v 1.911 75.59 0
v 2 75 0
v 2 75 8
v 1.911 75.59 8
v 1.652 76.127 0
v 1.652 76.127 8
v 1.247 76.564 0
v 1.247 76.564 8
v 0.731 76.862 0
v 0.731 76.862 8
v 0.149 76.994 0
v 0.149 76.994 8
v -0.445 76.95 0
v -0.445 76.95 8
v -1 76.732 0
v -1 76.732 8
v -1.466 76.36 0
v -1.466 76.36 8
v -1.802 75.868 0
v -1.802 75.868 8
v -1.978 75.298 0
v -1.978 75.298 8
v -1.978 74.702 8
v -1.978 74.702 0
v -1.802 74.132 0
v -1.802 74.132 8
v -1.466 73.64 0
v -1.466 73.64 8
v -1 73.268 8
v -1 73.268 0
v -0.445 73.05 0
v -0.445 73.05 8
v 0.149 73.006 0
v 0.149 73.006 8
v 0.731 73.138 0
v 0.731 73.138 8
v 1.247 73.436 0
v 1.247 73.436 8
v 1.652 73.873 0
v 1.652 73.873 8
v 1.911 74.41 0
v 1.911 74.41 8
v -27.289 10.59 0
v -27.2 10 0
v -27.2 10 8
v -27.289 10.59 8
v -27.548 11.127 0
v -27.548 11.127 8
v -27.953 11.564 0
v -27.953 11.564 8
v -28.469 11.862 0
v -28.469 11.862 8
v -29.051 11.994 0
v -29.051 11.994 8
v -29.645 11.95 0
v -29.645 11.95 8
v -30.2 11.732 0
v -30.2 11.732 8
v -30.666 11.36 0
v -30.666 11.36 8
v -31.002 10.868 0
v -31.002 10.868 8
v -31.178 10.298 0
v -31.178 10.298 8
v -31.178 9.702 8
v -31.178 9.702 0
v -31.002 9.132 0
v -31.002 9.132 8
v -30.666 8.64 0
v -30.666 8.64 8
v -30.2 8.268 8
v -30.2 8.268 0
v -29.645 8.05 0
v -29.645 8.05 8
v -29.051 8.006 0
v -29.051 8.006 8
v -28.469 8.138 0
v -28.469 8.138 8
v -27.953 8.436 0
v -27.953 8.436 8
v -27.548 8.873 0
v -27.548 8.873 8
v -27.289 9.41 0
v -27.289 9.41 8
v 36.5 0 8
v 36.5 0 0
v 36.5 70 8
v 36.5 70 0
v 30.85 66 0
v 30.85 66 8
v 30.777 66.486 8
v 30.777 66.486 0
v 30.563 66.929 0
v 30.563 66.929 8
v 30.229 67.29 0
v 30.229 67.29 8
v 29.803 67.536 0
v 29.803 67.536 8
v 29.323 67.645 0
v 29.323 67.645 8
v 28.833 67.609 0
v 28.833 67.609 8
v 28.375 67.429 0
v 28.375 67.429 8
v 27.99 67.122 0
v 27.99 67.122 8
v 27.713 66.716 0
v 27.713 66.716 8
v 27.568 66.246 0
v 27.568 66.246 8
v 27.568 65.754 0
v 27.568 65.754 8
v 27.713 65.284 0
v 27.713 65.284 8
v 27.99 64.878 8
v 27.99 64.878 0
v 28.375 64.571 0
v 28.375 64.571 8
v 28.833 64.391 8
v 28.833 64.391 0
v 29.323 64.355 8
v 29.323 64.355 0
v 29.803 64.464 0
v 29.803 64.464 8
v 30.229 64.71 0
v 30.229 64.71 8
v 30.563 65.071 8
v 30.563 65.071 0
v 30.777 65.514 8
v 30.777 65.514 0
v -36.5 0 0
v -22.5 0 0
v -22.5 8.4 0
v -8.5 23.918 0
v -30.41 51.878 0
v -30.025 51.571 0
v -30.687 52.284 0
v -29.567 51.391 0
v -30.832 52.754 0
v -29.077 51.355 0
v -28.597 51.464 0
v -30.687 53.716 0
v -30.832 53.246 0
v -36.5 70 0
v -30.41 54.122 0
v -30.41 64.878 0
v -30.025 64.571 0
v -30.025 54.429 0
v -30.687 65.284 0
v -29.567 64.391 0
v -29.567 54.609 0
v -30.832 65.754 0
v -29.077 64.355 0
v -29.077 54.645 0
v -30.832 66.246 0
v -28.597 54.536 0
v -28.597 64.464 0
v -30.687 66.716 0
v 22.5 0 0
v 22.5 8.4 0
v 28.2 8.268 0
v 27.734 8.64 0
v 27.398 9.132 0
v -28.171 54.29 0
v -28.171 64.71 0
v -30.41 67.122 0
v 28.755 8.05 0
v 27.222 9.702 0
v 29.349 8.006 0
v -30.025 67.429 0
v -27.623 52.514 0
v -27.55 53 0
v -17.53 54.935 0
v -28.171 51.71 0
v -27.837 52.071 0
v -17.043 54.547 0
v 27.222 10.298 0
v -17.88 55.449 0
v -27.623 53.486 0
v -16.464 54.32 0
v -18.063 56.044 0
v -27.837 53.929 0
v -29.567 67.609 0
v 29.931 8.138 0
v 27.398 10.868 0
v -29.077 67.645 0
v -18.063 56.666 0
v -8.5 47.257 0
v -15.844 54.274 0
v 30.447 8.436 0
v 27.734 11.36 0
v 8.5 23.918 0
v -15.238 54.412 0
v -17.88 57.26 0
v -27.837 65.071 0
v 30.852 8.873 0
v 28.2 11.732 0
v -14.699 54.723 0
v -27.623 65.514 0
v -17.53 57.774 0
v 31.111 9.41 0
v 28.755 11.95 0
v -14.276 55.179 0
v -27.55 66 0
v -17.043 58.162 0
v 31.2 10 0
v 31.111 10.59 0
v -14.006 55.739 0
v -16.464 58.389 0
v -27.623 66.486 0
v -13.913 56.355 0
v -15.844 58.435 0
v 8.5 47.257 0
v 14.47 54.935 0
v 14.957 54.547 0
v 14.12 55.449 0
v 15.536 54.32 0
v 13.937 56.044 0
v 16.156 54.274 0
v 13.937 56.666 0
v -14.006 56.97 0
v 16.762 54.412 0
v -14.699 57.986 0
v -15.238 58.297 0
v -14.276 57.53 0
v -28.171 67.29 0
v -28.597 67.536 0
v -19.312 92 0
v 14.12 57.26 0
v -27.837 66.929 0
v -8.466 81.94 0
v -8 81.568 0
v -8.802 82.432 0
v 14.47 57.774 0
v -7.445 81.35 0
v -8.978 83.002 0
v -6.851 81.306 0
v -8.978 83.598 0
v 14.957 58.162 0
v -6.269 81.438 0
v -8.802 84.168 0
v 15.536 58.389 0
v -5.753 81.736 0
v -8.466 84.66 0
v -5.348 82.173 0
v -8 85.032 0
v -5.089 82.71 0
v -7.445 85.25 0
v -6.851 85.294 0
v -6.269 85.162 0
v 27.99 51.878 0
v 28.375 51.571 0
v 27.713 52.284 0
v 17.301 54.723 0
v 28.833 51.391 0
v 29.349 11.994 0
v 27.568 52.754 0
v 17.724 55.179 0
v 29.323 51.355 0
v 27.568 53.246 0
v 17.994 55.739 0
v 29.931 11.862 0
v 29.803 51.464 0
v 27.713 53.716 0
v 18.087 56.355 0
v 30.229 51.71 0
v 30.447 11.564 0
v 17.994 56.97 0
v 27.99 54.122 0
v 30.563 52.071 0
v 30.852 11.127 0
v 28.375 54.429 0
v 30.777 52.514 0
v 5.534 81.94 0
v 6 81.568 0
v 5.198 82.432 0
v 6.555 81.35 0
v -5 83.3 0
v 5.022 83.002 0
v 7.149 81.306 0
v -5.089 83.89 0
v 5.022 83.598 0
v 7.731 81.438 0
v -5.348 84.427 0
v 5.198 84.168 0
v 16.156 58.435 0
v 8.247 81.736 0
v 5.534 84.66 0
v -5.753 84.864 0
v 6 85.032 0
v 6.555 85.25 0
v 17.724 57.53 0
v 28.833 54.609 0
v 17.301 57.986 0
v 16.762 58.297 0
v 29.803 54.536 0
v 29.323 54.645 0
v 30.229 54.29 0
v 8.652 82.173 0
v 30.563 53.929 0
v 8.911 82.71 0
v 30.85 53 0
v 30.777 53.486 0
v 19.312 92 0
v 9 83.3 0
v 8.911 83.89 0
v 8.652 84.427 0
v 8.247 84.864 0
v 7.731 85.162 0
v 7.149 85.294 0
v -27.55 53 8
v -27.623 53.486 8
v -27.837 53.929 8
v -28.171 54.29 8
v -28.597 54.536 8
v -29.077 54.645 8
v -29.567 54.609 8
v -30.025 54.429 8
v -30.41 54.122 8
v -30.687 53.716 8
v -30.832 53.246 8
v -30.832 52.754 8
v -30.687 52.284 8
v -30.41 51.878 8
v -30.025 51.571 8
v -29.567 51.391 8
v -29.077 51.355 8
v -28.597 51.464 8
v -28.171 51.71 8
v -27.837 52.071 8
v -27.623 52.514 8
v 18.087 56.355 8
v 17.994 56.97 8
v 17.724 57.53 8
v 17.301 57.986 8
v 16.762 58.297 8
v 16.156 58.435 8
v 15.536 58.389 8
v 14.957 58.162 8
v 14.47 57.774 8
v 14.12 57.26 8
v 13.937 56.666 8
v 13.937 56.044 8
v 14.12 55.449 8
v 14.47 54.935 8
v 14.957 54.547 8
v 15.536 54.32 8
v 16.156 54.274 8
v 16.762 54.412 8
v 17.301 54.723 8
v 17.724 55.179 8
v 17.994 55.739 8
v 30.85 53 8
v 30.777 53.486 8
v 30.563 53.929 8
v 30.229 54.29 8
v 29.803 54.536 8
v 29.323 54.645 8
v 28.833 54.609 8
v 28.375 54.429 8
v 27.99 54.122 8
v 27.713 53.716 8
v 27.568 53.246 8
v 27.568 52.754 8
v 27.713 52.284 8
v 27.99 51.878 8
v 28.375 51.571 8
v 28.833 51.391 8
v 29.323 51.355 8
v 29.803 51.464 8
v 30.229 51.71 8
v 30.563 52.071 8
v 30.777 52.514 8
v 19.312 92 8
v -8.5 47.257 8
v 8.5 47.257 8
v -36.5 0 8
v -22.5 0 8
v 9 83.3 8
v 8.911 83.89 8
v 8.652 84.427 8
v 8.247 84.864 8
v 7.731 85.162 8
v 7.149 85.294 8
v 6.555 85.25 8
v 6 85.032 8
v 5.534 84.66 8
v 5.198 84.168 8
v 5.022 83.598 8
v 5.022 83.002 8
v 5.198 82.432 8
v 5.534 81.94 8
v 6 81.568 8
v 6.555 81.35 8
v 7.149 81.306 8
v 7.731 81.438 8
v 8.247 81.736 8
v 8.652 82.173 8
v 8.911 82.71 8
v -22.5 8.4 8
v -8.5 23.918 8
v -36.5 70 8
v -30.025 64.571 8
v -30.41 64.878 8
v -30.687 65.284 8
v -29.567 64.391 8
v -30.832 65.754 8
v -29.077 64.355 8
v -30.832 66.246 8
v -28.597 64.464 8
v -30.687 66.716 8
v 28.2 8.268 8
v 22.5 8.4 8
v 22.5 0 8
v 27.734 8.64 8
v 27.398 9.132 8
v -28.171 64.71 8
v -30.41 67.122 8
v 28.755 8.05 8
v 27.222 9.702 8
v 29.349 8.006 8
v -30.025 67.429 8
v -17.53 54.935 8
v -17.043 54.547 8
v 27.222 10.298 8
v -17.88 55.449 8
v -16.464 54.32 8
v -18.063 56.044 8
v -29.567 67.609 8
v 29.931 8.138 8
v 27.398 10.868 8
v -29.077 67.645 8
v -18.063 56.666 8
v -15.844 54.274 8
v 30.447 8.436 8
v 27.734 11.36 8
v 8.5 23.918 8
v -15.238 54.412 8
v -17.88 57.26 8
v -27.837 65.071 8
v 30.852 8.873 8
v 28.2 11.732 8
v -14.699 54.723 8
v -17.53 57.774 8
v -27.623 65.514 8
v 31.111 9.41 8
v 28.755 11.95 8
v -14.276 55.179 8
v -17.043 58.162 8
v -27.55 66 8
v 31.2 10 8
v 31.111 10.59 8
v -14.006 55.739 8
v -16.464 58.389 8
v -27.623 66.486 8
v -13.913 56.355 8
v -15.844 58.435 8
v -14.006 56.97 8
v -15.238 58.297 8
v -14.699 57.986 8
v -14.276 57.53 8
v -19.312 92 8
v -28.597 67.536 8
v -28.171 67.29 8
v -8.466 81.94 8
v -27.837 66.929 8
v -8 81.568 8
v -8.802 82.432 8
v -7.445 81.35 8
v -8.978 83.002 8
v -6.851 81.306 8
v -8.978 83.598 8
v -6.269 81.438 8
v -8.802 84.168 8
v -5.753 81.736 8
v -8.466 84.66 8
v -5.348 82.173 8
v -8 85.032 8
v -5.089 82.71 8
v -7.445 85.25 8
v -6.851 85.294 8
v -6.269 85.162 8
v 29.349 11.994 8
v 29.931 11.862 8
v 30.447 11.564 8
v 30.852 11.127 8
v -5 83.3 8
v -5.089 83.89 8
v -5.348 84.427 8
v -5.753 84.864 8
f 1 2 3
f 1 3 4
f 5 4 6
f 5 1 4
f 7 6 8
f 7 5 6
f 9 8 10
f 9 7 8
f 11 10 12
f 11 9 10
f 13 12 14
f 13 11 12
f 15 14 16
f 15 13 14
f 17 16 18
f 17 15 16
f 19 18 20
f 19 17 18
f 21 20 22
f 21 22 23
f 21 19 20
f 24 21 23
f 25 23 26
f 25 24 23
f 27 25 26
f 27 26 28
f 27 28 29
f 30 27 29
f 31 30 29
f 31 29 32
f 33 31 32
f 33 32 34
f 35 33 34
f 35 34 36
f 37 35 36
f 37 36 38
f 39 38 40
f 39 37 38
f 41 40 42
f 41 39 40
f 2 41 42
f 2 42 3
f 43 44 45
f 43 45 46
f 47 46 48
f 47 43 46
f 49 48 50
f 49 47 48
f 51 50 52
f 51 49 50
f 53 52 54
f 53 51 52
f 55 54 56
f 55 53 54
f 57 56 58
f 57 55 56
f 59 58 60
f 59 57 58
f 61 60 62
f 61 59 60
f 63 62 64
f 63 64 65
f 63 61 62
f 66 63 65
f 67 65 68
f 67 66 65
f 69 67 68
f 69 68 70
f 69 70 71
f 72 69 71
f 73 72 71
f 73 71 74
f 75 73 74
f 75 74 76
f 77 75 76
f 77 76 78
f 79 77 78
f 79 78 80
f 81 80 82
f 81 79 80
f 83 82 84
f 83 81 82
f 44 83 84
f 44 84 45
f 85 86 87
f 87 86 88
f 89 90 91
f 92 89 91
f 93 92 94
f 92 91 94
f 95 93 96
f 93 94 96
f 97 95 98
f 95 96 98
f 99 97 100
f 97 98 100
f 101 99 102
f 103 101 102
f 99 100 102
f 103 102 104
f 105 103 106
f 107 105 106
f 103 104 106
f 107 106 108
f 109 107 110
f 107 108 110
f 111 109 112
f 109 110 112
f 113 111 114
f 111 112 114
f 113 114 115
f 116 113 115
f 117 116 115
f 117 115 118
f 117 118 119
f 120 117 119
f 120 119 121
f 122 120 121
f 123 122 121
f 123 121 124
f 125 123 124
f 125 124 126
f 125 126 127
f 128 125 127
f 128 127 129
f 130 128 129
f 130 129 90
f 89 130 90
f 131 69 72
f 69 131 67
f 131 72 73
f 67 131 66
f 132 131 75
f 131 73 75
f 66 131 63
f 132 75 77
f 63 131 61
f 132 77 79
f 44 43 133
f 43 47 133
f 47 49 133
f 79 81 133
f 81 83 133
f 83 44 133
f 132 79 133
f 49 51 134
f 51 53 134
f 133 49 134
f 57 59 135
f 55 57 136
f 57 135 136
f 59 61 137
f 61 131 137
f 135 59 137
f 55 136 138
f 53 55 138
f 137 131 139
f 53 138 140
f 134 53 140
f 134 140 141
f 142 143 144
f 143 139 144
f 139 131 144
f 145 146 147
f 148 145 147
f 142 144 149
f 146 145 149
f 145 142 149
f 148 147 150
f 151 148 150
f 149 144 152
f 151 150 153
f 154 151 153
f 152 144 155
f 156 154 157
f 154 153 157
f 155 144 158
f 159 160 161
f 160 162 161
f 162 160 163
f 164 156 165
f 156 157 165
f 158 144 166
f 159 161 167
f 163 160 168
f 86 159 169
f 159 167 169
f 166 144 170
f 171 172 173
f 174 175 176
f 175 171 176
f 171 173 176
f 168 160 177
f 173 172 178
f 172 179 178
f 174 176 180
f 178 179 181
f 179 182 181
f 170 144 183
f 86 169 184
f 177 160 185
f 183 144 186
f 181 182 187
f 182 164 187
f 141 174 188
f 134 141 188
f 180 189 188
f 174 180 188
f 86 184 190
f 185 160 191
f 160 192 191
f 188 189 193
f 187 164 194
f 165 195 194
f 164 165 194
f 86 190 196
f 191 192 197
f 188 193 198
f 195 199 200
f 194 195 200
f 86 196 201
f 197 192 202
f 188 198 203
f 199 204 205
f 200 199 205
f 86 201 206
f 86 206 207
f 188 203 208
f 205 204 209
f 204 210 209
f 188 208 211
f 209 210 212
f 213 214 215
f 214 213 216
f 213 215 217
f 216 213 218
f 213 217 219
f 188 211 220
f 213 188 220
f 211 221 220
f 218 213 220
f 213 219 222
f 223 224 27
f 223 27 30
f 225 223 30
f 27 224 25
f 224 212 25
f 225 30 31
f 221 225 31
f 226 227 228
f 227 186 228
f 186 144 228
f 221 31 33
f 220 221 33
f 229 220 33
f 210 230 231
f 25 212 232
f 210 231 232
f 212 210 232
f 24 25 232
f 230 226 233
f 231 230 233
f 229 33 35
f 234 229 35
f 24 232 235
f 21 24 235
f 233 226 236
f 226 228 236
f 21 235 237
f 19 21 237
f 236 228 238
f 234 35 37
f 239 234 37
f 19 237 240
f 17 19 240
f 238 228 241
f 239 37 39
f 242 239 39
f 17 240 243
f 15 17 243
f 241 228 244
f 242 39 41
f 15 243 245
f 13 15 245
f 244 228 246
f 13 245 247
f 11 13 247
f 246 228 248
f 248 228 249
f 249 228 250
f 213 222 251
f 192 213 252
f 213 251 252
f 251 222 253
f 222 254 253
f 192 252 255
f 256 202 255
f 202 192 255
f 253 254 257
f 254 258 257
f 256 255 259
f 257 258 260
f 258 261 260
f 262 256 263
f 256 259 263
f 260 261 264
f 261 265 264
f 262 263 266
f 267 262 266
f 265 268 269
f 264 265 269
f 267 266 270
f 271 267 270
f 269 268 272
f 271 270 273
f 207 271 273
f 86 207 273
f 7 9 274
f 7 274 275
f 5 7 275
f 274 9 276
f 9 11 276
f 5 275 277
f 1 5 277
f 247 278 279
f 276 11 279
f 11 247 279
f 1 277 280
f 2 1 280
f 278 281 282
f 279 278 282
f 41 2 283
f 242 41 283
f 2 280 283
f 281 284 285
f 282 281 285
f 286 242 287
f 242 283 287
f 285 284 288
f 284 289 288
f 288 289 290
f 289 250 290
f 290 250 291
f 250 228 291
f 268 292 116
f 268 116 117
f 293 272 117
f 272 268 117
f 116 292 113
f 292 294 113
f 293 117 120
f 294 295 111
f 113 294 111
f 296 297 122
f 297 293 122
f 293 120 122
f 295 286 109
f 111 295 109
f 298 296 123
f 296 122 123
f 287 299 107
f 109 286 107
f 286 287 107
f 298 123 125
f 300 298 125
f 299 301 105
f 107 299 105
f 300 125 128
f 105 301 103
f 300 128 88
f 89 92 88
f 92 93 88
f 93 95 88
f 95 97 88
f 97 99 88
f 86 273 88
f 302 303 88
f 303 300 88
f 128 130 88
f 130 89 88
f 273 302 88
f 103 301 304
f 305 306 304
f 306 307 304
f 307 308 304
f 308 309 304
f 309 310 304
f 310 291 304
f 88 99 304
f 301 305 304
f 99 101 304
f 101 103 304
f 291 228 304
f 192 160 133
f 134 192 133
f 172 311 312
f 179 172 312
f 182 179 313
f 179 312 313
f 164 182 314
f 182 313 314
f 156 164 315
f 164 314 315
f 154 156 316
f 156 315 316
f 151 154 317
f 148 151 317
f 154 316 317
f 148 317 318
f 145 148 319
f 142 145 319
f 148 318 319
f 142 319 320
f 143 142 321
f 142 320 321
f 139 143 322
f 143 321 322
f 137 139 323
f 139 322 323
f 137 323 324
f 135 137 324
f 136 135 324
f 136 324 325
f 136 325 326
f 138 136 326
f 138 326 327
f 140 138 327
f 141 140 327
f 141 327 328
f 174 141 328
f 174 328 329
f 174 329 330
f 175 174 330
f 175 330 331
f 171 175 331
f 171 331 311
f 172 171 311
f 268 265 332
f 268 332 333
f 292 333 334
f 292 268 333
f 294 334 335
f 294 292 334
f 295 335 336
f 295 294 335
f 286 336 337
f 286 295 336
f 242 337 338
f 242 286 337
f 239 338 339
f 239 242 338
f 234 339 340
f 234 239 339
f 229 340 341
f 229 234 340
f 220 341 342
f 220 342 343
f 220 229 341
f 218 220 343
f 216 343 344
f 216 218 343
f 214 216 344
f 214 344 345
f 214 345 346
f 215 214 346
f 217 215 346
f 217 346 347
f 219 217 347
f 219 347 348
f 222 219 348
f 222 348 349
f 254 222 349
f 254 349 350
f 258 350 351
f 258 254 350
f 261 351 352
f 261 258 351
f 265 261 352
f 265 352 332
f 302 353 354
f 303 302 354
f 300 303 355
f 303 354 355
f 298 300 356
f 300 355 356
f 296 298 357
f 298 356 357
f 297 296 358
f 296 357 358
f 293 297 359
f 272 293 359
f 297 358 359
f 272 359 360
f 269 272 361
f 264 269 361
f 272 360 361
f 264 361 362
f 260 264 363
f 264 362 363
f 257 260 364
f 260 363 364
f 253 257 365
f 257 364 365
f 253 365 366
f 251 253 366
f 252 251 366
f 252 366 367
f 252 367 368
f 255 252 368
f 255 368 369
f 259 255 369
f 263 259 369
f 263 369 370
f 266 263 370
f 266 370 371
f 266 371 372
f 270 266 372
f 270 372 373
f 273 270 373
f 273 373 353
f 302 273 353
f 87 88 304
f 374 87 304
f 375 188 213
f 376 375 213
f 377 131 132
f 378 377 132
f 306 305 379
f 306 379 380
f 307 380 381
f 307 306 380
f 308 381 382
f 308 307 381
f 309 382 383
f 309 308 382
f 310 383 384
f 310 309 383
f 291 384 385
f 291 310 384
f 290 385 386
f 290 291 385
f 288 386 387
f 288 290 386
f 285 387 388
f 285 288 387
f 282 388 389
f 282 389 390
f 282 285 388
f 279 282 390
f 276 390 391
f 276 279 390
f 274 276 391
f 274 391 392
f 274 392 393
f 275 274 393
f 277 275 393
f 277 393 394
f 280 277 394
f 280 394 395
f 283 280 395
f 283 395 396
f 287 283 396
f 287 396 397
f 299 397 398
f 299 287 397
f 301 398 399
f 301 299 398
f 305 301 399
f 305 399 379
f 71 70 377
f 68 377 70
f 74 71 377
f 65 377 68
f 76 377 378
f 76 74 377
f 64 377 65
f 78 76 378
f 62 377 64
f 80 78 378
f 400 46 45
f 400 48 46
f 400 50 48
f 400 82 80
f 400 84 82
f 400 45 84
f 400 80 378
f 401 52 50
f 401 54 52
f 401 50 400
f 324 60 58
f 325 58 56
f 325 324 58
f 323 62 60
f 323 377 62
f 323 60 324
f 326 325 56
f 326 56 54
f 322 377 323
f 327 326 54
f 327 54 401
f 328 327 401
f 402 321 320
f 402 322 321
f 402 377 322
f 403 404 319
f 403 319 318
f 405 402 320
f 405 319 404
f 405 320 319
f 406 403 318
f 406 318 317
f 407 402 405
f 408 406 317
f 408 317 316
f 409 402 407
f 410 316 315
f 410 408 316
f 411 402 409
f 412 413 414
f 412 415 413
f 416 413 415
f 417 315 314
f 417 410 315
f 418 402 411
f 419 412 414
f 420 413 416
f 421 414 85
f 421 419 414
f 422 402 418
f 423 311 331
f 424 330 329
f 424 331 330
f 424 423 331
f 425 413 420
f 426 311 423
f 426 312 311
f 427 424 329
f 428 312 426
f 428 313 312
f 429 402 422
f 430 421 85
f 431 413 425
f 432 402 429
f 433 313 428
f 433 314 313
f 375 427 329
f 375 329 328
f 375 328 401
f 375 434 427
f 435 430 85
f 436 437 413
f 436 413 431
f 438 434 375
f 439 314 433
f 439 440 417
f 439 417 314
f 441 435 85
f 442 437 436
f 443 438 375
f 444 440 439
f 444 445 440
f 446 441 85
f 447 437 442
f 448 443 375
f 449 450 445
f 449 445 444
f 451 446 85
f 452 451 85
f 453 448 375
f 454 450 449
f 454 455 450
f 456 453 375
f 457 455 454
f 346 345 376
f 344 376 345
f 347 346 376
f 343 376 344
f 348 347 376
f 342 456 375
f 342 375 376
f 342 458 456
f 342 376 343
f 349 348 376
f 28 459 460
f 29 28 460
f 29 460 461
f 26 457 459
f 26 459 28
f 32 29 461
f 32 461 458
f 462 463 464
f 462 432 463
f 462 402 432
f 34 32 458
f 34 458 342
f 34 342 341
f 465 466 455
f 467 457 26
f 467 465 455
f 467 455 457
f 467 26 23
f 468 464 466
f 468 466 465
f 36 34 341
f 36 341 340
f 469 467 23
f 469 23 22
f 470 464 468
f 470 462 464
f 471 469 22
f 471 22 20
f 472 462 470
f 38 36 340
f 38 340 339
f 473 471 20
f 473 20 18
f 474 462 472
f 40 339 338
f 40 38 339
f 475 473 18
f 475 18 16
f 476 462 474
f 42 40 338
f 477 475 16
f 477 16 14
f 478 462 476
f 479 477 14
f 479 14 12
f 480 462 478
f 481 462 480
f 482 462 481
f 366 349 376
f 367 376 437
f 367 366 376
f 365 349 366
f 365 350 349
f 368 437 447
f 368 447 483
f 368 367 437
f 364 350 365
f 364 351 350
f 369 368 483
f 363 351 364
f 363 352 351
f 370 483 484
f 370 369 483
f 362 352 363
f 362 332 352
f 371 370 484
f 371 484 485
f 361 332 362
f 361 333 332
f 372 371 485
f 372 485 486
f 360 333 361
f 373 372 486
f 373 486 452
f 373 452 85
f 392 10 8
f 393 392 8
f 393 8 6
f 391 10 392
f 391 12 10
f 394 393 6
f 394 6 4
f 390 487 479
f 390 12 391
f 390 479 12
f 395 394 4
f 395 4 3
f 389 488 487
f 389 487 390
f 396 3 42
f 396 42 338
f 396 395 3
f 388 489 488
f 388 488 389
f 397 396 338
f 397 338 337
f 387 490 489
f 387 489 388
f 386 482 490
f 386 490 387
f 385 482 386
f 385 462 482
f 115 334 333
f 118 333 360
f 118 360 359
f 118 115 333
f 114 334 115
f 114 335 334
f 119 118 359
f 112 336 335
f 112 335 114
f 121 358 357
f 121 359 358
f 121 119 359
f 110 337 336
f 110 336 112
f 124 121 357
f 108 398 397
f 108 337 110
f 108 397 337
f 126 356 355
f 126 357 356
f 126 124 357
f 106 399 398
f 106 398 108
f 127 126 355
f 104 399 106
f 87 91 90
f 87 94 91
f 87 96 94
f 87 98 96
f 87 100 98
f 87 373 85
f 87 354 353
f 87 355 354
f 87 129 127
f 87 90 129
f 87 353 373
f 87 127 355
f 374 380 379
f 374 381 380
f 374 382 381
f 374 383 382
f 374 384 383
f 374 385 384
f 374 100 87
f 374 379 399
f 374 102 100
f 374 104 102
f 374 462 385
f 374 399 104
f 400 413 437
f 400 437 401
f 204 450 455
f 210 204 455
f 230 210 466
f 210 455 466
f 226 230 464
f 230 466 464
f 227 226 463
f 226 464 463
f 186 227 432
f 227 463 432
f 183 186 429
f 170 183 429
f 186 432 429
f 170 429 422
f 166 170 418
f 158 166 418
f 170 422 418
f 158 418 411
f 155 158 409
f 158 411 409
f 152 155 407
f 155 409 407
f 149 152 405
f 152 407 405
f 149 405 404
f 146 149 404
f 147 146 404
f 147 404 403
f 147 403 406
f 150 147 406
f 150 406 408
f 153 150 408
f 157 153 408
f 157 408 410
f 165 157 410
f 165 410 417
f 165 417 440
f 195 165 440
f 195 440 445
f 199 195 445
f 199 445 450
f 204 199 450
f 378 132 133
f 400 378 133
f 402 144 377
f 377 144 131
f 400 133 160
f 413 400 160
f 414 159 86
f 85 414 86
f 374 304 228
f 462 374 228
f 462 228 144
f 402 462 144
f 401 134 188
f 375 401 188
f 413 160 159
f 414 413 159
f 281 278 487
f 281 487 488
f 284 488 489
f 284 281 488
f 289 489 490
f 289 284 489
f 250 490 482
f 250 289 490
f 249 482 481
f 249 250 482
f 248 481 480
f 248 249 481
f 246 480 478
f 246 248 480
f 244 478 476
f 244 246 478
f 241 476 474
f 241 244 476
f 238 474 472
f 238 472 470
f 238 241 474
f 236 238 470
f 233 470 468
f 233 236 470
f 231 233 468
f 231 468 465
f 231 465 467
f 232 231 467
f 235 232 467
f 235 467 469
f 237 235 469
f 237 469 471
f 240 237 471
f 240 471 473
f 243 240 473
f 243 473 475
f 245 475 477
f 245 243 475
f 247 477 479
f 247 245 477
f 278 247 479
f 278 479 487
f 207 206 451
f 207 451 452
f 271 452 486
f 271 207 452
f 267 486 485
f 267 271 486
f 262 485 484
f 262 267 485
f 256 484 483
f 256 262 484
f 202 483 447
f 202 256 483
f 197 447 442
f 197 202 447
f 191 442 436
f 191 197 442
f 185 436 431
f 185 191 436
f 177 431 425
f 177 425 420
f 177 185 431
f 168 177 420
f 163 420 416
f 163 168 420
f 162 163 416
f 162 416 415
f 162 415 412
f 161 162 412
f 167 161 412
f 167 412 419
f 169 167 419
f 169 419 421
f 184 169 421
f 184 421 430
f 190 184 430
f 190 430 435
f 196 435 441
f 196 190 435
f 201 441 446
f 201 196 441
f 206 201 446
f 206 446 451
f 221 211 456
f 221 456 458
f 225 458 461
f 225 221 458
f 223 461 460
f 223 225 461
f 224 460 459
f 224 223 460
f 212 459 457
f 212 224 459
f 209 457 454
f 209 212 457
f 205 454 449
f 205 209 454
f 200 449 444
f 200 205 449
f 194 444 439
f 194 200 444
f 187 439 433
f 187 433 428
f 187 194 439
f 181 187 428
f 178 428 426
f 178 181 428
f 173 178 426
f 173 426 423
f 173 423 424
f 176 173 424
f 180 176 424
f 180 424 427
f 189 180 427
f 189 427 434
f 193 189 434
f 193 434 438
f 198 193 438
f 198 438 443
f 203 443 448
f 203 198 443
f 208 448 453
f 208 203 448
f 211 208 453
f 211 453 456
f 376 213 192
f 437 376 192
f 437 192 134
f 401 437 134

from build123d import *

# Parameters (mm, degrees)
ESBO_O1_R                = 2
ESBO_O1_R_2              = 2.086716092
ESBO_O1_R_3              = 2.086717953
RESSALTO_EXTRUS_O1_DEPTH = 8
ESBO_O4_R                = 1.65
CORTE_EXTRUS_O1_DEPTH    = 9


with BuildPart() as part:
    # Esboço1 → Ressalto-extrusão1 (new body)
    with BuildSketch(Plane.XY):
        Polygon((19.311716217, 92), (-19.311716217, 92), (-36.5, 70), (-36.5, 0), (-22.499999998, 0), (-22.499999998, 8.400000004), (22.499999998, 8.400000004), (22.499999998, 0), (36.5, 0), (36.5, 70), align=None)
        with Locations((0, 75)):
            Circle(ESBO_O1_R, mode=Mode.SUBTRACT)
        with Locations((-7, 83.3)):
            Circle(ESBO_O1_R, mode=Mode.SUBTRACT)
        with Locations((7, 83.3)):
            Circle(ESBO_O1_R, mode=Mode.SUBTRACT)
        with Locations((-29.2, 10)):
            Circle(ESBO_O1_R, mode=Mode.SUBTRACT)
        with Locations((29.2, 10)):
            Circle(ESBO_O1_R, mode=Mode.SUBTRACT)
        with Locations((-16, 56.354540575)):
            Circle(ESBO_O1_R_2, mode=Mode.SUBTRACT)
        with Locations((16, 56.354540575)):
            Circle(ESBO_O1_R_3, mode=Mode.SUBTRACT)
        Polygon((0, 47.257129716), (8.5, 47.257129716), (8.5, 23.917682695), (0, 23.917682695), (-8.5, 23.917682695), (-8.5, 47.257129716), align=None, mode=Mode.SUBTRACT)
    extrude(amount=RESSALTO_EXTRUS_O1_DEPTH)

    # Esboço4 → Corte-extrusão1 (cut, through all)
    with BuildSketch(Plane.XY.offset(8)):
        with Locations((-29.2, 66)):
            Circle(ESBO_O4_R)
        with Locations((-29.2, 53)):
            Circle(ESBO_O4_R)
        with Locations((29.2, 53)):
            Circle(ESBO_O4_R)
        with Locations((29.2, 66)):
            Circle(ESBO_O4_R)
    extrude(amount=-CORTE_EXTRUS_O1_DEPTH, mode=Mode.SUBTRACT)


solid = part.part
